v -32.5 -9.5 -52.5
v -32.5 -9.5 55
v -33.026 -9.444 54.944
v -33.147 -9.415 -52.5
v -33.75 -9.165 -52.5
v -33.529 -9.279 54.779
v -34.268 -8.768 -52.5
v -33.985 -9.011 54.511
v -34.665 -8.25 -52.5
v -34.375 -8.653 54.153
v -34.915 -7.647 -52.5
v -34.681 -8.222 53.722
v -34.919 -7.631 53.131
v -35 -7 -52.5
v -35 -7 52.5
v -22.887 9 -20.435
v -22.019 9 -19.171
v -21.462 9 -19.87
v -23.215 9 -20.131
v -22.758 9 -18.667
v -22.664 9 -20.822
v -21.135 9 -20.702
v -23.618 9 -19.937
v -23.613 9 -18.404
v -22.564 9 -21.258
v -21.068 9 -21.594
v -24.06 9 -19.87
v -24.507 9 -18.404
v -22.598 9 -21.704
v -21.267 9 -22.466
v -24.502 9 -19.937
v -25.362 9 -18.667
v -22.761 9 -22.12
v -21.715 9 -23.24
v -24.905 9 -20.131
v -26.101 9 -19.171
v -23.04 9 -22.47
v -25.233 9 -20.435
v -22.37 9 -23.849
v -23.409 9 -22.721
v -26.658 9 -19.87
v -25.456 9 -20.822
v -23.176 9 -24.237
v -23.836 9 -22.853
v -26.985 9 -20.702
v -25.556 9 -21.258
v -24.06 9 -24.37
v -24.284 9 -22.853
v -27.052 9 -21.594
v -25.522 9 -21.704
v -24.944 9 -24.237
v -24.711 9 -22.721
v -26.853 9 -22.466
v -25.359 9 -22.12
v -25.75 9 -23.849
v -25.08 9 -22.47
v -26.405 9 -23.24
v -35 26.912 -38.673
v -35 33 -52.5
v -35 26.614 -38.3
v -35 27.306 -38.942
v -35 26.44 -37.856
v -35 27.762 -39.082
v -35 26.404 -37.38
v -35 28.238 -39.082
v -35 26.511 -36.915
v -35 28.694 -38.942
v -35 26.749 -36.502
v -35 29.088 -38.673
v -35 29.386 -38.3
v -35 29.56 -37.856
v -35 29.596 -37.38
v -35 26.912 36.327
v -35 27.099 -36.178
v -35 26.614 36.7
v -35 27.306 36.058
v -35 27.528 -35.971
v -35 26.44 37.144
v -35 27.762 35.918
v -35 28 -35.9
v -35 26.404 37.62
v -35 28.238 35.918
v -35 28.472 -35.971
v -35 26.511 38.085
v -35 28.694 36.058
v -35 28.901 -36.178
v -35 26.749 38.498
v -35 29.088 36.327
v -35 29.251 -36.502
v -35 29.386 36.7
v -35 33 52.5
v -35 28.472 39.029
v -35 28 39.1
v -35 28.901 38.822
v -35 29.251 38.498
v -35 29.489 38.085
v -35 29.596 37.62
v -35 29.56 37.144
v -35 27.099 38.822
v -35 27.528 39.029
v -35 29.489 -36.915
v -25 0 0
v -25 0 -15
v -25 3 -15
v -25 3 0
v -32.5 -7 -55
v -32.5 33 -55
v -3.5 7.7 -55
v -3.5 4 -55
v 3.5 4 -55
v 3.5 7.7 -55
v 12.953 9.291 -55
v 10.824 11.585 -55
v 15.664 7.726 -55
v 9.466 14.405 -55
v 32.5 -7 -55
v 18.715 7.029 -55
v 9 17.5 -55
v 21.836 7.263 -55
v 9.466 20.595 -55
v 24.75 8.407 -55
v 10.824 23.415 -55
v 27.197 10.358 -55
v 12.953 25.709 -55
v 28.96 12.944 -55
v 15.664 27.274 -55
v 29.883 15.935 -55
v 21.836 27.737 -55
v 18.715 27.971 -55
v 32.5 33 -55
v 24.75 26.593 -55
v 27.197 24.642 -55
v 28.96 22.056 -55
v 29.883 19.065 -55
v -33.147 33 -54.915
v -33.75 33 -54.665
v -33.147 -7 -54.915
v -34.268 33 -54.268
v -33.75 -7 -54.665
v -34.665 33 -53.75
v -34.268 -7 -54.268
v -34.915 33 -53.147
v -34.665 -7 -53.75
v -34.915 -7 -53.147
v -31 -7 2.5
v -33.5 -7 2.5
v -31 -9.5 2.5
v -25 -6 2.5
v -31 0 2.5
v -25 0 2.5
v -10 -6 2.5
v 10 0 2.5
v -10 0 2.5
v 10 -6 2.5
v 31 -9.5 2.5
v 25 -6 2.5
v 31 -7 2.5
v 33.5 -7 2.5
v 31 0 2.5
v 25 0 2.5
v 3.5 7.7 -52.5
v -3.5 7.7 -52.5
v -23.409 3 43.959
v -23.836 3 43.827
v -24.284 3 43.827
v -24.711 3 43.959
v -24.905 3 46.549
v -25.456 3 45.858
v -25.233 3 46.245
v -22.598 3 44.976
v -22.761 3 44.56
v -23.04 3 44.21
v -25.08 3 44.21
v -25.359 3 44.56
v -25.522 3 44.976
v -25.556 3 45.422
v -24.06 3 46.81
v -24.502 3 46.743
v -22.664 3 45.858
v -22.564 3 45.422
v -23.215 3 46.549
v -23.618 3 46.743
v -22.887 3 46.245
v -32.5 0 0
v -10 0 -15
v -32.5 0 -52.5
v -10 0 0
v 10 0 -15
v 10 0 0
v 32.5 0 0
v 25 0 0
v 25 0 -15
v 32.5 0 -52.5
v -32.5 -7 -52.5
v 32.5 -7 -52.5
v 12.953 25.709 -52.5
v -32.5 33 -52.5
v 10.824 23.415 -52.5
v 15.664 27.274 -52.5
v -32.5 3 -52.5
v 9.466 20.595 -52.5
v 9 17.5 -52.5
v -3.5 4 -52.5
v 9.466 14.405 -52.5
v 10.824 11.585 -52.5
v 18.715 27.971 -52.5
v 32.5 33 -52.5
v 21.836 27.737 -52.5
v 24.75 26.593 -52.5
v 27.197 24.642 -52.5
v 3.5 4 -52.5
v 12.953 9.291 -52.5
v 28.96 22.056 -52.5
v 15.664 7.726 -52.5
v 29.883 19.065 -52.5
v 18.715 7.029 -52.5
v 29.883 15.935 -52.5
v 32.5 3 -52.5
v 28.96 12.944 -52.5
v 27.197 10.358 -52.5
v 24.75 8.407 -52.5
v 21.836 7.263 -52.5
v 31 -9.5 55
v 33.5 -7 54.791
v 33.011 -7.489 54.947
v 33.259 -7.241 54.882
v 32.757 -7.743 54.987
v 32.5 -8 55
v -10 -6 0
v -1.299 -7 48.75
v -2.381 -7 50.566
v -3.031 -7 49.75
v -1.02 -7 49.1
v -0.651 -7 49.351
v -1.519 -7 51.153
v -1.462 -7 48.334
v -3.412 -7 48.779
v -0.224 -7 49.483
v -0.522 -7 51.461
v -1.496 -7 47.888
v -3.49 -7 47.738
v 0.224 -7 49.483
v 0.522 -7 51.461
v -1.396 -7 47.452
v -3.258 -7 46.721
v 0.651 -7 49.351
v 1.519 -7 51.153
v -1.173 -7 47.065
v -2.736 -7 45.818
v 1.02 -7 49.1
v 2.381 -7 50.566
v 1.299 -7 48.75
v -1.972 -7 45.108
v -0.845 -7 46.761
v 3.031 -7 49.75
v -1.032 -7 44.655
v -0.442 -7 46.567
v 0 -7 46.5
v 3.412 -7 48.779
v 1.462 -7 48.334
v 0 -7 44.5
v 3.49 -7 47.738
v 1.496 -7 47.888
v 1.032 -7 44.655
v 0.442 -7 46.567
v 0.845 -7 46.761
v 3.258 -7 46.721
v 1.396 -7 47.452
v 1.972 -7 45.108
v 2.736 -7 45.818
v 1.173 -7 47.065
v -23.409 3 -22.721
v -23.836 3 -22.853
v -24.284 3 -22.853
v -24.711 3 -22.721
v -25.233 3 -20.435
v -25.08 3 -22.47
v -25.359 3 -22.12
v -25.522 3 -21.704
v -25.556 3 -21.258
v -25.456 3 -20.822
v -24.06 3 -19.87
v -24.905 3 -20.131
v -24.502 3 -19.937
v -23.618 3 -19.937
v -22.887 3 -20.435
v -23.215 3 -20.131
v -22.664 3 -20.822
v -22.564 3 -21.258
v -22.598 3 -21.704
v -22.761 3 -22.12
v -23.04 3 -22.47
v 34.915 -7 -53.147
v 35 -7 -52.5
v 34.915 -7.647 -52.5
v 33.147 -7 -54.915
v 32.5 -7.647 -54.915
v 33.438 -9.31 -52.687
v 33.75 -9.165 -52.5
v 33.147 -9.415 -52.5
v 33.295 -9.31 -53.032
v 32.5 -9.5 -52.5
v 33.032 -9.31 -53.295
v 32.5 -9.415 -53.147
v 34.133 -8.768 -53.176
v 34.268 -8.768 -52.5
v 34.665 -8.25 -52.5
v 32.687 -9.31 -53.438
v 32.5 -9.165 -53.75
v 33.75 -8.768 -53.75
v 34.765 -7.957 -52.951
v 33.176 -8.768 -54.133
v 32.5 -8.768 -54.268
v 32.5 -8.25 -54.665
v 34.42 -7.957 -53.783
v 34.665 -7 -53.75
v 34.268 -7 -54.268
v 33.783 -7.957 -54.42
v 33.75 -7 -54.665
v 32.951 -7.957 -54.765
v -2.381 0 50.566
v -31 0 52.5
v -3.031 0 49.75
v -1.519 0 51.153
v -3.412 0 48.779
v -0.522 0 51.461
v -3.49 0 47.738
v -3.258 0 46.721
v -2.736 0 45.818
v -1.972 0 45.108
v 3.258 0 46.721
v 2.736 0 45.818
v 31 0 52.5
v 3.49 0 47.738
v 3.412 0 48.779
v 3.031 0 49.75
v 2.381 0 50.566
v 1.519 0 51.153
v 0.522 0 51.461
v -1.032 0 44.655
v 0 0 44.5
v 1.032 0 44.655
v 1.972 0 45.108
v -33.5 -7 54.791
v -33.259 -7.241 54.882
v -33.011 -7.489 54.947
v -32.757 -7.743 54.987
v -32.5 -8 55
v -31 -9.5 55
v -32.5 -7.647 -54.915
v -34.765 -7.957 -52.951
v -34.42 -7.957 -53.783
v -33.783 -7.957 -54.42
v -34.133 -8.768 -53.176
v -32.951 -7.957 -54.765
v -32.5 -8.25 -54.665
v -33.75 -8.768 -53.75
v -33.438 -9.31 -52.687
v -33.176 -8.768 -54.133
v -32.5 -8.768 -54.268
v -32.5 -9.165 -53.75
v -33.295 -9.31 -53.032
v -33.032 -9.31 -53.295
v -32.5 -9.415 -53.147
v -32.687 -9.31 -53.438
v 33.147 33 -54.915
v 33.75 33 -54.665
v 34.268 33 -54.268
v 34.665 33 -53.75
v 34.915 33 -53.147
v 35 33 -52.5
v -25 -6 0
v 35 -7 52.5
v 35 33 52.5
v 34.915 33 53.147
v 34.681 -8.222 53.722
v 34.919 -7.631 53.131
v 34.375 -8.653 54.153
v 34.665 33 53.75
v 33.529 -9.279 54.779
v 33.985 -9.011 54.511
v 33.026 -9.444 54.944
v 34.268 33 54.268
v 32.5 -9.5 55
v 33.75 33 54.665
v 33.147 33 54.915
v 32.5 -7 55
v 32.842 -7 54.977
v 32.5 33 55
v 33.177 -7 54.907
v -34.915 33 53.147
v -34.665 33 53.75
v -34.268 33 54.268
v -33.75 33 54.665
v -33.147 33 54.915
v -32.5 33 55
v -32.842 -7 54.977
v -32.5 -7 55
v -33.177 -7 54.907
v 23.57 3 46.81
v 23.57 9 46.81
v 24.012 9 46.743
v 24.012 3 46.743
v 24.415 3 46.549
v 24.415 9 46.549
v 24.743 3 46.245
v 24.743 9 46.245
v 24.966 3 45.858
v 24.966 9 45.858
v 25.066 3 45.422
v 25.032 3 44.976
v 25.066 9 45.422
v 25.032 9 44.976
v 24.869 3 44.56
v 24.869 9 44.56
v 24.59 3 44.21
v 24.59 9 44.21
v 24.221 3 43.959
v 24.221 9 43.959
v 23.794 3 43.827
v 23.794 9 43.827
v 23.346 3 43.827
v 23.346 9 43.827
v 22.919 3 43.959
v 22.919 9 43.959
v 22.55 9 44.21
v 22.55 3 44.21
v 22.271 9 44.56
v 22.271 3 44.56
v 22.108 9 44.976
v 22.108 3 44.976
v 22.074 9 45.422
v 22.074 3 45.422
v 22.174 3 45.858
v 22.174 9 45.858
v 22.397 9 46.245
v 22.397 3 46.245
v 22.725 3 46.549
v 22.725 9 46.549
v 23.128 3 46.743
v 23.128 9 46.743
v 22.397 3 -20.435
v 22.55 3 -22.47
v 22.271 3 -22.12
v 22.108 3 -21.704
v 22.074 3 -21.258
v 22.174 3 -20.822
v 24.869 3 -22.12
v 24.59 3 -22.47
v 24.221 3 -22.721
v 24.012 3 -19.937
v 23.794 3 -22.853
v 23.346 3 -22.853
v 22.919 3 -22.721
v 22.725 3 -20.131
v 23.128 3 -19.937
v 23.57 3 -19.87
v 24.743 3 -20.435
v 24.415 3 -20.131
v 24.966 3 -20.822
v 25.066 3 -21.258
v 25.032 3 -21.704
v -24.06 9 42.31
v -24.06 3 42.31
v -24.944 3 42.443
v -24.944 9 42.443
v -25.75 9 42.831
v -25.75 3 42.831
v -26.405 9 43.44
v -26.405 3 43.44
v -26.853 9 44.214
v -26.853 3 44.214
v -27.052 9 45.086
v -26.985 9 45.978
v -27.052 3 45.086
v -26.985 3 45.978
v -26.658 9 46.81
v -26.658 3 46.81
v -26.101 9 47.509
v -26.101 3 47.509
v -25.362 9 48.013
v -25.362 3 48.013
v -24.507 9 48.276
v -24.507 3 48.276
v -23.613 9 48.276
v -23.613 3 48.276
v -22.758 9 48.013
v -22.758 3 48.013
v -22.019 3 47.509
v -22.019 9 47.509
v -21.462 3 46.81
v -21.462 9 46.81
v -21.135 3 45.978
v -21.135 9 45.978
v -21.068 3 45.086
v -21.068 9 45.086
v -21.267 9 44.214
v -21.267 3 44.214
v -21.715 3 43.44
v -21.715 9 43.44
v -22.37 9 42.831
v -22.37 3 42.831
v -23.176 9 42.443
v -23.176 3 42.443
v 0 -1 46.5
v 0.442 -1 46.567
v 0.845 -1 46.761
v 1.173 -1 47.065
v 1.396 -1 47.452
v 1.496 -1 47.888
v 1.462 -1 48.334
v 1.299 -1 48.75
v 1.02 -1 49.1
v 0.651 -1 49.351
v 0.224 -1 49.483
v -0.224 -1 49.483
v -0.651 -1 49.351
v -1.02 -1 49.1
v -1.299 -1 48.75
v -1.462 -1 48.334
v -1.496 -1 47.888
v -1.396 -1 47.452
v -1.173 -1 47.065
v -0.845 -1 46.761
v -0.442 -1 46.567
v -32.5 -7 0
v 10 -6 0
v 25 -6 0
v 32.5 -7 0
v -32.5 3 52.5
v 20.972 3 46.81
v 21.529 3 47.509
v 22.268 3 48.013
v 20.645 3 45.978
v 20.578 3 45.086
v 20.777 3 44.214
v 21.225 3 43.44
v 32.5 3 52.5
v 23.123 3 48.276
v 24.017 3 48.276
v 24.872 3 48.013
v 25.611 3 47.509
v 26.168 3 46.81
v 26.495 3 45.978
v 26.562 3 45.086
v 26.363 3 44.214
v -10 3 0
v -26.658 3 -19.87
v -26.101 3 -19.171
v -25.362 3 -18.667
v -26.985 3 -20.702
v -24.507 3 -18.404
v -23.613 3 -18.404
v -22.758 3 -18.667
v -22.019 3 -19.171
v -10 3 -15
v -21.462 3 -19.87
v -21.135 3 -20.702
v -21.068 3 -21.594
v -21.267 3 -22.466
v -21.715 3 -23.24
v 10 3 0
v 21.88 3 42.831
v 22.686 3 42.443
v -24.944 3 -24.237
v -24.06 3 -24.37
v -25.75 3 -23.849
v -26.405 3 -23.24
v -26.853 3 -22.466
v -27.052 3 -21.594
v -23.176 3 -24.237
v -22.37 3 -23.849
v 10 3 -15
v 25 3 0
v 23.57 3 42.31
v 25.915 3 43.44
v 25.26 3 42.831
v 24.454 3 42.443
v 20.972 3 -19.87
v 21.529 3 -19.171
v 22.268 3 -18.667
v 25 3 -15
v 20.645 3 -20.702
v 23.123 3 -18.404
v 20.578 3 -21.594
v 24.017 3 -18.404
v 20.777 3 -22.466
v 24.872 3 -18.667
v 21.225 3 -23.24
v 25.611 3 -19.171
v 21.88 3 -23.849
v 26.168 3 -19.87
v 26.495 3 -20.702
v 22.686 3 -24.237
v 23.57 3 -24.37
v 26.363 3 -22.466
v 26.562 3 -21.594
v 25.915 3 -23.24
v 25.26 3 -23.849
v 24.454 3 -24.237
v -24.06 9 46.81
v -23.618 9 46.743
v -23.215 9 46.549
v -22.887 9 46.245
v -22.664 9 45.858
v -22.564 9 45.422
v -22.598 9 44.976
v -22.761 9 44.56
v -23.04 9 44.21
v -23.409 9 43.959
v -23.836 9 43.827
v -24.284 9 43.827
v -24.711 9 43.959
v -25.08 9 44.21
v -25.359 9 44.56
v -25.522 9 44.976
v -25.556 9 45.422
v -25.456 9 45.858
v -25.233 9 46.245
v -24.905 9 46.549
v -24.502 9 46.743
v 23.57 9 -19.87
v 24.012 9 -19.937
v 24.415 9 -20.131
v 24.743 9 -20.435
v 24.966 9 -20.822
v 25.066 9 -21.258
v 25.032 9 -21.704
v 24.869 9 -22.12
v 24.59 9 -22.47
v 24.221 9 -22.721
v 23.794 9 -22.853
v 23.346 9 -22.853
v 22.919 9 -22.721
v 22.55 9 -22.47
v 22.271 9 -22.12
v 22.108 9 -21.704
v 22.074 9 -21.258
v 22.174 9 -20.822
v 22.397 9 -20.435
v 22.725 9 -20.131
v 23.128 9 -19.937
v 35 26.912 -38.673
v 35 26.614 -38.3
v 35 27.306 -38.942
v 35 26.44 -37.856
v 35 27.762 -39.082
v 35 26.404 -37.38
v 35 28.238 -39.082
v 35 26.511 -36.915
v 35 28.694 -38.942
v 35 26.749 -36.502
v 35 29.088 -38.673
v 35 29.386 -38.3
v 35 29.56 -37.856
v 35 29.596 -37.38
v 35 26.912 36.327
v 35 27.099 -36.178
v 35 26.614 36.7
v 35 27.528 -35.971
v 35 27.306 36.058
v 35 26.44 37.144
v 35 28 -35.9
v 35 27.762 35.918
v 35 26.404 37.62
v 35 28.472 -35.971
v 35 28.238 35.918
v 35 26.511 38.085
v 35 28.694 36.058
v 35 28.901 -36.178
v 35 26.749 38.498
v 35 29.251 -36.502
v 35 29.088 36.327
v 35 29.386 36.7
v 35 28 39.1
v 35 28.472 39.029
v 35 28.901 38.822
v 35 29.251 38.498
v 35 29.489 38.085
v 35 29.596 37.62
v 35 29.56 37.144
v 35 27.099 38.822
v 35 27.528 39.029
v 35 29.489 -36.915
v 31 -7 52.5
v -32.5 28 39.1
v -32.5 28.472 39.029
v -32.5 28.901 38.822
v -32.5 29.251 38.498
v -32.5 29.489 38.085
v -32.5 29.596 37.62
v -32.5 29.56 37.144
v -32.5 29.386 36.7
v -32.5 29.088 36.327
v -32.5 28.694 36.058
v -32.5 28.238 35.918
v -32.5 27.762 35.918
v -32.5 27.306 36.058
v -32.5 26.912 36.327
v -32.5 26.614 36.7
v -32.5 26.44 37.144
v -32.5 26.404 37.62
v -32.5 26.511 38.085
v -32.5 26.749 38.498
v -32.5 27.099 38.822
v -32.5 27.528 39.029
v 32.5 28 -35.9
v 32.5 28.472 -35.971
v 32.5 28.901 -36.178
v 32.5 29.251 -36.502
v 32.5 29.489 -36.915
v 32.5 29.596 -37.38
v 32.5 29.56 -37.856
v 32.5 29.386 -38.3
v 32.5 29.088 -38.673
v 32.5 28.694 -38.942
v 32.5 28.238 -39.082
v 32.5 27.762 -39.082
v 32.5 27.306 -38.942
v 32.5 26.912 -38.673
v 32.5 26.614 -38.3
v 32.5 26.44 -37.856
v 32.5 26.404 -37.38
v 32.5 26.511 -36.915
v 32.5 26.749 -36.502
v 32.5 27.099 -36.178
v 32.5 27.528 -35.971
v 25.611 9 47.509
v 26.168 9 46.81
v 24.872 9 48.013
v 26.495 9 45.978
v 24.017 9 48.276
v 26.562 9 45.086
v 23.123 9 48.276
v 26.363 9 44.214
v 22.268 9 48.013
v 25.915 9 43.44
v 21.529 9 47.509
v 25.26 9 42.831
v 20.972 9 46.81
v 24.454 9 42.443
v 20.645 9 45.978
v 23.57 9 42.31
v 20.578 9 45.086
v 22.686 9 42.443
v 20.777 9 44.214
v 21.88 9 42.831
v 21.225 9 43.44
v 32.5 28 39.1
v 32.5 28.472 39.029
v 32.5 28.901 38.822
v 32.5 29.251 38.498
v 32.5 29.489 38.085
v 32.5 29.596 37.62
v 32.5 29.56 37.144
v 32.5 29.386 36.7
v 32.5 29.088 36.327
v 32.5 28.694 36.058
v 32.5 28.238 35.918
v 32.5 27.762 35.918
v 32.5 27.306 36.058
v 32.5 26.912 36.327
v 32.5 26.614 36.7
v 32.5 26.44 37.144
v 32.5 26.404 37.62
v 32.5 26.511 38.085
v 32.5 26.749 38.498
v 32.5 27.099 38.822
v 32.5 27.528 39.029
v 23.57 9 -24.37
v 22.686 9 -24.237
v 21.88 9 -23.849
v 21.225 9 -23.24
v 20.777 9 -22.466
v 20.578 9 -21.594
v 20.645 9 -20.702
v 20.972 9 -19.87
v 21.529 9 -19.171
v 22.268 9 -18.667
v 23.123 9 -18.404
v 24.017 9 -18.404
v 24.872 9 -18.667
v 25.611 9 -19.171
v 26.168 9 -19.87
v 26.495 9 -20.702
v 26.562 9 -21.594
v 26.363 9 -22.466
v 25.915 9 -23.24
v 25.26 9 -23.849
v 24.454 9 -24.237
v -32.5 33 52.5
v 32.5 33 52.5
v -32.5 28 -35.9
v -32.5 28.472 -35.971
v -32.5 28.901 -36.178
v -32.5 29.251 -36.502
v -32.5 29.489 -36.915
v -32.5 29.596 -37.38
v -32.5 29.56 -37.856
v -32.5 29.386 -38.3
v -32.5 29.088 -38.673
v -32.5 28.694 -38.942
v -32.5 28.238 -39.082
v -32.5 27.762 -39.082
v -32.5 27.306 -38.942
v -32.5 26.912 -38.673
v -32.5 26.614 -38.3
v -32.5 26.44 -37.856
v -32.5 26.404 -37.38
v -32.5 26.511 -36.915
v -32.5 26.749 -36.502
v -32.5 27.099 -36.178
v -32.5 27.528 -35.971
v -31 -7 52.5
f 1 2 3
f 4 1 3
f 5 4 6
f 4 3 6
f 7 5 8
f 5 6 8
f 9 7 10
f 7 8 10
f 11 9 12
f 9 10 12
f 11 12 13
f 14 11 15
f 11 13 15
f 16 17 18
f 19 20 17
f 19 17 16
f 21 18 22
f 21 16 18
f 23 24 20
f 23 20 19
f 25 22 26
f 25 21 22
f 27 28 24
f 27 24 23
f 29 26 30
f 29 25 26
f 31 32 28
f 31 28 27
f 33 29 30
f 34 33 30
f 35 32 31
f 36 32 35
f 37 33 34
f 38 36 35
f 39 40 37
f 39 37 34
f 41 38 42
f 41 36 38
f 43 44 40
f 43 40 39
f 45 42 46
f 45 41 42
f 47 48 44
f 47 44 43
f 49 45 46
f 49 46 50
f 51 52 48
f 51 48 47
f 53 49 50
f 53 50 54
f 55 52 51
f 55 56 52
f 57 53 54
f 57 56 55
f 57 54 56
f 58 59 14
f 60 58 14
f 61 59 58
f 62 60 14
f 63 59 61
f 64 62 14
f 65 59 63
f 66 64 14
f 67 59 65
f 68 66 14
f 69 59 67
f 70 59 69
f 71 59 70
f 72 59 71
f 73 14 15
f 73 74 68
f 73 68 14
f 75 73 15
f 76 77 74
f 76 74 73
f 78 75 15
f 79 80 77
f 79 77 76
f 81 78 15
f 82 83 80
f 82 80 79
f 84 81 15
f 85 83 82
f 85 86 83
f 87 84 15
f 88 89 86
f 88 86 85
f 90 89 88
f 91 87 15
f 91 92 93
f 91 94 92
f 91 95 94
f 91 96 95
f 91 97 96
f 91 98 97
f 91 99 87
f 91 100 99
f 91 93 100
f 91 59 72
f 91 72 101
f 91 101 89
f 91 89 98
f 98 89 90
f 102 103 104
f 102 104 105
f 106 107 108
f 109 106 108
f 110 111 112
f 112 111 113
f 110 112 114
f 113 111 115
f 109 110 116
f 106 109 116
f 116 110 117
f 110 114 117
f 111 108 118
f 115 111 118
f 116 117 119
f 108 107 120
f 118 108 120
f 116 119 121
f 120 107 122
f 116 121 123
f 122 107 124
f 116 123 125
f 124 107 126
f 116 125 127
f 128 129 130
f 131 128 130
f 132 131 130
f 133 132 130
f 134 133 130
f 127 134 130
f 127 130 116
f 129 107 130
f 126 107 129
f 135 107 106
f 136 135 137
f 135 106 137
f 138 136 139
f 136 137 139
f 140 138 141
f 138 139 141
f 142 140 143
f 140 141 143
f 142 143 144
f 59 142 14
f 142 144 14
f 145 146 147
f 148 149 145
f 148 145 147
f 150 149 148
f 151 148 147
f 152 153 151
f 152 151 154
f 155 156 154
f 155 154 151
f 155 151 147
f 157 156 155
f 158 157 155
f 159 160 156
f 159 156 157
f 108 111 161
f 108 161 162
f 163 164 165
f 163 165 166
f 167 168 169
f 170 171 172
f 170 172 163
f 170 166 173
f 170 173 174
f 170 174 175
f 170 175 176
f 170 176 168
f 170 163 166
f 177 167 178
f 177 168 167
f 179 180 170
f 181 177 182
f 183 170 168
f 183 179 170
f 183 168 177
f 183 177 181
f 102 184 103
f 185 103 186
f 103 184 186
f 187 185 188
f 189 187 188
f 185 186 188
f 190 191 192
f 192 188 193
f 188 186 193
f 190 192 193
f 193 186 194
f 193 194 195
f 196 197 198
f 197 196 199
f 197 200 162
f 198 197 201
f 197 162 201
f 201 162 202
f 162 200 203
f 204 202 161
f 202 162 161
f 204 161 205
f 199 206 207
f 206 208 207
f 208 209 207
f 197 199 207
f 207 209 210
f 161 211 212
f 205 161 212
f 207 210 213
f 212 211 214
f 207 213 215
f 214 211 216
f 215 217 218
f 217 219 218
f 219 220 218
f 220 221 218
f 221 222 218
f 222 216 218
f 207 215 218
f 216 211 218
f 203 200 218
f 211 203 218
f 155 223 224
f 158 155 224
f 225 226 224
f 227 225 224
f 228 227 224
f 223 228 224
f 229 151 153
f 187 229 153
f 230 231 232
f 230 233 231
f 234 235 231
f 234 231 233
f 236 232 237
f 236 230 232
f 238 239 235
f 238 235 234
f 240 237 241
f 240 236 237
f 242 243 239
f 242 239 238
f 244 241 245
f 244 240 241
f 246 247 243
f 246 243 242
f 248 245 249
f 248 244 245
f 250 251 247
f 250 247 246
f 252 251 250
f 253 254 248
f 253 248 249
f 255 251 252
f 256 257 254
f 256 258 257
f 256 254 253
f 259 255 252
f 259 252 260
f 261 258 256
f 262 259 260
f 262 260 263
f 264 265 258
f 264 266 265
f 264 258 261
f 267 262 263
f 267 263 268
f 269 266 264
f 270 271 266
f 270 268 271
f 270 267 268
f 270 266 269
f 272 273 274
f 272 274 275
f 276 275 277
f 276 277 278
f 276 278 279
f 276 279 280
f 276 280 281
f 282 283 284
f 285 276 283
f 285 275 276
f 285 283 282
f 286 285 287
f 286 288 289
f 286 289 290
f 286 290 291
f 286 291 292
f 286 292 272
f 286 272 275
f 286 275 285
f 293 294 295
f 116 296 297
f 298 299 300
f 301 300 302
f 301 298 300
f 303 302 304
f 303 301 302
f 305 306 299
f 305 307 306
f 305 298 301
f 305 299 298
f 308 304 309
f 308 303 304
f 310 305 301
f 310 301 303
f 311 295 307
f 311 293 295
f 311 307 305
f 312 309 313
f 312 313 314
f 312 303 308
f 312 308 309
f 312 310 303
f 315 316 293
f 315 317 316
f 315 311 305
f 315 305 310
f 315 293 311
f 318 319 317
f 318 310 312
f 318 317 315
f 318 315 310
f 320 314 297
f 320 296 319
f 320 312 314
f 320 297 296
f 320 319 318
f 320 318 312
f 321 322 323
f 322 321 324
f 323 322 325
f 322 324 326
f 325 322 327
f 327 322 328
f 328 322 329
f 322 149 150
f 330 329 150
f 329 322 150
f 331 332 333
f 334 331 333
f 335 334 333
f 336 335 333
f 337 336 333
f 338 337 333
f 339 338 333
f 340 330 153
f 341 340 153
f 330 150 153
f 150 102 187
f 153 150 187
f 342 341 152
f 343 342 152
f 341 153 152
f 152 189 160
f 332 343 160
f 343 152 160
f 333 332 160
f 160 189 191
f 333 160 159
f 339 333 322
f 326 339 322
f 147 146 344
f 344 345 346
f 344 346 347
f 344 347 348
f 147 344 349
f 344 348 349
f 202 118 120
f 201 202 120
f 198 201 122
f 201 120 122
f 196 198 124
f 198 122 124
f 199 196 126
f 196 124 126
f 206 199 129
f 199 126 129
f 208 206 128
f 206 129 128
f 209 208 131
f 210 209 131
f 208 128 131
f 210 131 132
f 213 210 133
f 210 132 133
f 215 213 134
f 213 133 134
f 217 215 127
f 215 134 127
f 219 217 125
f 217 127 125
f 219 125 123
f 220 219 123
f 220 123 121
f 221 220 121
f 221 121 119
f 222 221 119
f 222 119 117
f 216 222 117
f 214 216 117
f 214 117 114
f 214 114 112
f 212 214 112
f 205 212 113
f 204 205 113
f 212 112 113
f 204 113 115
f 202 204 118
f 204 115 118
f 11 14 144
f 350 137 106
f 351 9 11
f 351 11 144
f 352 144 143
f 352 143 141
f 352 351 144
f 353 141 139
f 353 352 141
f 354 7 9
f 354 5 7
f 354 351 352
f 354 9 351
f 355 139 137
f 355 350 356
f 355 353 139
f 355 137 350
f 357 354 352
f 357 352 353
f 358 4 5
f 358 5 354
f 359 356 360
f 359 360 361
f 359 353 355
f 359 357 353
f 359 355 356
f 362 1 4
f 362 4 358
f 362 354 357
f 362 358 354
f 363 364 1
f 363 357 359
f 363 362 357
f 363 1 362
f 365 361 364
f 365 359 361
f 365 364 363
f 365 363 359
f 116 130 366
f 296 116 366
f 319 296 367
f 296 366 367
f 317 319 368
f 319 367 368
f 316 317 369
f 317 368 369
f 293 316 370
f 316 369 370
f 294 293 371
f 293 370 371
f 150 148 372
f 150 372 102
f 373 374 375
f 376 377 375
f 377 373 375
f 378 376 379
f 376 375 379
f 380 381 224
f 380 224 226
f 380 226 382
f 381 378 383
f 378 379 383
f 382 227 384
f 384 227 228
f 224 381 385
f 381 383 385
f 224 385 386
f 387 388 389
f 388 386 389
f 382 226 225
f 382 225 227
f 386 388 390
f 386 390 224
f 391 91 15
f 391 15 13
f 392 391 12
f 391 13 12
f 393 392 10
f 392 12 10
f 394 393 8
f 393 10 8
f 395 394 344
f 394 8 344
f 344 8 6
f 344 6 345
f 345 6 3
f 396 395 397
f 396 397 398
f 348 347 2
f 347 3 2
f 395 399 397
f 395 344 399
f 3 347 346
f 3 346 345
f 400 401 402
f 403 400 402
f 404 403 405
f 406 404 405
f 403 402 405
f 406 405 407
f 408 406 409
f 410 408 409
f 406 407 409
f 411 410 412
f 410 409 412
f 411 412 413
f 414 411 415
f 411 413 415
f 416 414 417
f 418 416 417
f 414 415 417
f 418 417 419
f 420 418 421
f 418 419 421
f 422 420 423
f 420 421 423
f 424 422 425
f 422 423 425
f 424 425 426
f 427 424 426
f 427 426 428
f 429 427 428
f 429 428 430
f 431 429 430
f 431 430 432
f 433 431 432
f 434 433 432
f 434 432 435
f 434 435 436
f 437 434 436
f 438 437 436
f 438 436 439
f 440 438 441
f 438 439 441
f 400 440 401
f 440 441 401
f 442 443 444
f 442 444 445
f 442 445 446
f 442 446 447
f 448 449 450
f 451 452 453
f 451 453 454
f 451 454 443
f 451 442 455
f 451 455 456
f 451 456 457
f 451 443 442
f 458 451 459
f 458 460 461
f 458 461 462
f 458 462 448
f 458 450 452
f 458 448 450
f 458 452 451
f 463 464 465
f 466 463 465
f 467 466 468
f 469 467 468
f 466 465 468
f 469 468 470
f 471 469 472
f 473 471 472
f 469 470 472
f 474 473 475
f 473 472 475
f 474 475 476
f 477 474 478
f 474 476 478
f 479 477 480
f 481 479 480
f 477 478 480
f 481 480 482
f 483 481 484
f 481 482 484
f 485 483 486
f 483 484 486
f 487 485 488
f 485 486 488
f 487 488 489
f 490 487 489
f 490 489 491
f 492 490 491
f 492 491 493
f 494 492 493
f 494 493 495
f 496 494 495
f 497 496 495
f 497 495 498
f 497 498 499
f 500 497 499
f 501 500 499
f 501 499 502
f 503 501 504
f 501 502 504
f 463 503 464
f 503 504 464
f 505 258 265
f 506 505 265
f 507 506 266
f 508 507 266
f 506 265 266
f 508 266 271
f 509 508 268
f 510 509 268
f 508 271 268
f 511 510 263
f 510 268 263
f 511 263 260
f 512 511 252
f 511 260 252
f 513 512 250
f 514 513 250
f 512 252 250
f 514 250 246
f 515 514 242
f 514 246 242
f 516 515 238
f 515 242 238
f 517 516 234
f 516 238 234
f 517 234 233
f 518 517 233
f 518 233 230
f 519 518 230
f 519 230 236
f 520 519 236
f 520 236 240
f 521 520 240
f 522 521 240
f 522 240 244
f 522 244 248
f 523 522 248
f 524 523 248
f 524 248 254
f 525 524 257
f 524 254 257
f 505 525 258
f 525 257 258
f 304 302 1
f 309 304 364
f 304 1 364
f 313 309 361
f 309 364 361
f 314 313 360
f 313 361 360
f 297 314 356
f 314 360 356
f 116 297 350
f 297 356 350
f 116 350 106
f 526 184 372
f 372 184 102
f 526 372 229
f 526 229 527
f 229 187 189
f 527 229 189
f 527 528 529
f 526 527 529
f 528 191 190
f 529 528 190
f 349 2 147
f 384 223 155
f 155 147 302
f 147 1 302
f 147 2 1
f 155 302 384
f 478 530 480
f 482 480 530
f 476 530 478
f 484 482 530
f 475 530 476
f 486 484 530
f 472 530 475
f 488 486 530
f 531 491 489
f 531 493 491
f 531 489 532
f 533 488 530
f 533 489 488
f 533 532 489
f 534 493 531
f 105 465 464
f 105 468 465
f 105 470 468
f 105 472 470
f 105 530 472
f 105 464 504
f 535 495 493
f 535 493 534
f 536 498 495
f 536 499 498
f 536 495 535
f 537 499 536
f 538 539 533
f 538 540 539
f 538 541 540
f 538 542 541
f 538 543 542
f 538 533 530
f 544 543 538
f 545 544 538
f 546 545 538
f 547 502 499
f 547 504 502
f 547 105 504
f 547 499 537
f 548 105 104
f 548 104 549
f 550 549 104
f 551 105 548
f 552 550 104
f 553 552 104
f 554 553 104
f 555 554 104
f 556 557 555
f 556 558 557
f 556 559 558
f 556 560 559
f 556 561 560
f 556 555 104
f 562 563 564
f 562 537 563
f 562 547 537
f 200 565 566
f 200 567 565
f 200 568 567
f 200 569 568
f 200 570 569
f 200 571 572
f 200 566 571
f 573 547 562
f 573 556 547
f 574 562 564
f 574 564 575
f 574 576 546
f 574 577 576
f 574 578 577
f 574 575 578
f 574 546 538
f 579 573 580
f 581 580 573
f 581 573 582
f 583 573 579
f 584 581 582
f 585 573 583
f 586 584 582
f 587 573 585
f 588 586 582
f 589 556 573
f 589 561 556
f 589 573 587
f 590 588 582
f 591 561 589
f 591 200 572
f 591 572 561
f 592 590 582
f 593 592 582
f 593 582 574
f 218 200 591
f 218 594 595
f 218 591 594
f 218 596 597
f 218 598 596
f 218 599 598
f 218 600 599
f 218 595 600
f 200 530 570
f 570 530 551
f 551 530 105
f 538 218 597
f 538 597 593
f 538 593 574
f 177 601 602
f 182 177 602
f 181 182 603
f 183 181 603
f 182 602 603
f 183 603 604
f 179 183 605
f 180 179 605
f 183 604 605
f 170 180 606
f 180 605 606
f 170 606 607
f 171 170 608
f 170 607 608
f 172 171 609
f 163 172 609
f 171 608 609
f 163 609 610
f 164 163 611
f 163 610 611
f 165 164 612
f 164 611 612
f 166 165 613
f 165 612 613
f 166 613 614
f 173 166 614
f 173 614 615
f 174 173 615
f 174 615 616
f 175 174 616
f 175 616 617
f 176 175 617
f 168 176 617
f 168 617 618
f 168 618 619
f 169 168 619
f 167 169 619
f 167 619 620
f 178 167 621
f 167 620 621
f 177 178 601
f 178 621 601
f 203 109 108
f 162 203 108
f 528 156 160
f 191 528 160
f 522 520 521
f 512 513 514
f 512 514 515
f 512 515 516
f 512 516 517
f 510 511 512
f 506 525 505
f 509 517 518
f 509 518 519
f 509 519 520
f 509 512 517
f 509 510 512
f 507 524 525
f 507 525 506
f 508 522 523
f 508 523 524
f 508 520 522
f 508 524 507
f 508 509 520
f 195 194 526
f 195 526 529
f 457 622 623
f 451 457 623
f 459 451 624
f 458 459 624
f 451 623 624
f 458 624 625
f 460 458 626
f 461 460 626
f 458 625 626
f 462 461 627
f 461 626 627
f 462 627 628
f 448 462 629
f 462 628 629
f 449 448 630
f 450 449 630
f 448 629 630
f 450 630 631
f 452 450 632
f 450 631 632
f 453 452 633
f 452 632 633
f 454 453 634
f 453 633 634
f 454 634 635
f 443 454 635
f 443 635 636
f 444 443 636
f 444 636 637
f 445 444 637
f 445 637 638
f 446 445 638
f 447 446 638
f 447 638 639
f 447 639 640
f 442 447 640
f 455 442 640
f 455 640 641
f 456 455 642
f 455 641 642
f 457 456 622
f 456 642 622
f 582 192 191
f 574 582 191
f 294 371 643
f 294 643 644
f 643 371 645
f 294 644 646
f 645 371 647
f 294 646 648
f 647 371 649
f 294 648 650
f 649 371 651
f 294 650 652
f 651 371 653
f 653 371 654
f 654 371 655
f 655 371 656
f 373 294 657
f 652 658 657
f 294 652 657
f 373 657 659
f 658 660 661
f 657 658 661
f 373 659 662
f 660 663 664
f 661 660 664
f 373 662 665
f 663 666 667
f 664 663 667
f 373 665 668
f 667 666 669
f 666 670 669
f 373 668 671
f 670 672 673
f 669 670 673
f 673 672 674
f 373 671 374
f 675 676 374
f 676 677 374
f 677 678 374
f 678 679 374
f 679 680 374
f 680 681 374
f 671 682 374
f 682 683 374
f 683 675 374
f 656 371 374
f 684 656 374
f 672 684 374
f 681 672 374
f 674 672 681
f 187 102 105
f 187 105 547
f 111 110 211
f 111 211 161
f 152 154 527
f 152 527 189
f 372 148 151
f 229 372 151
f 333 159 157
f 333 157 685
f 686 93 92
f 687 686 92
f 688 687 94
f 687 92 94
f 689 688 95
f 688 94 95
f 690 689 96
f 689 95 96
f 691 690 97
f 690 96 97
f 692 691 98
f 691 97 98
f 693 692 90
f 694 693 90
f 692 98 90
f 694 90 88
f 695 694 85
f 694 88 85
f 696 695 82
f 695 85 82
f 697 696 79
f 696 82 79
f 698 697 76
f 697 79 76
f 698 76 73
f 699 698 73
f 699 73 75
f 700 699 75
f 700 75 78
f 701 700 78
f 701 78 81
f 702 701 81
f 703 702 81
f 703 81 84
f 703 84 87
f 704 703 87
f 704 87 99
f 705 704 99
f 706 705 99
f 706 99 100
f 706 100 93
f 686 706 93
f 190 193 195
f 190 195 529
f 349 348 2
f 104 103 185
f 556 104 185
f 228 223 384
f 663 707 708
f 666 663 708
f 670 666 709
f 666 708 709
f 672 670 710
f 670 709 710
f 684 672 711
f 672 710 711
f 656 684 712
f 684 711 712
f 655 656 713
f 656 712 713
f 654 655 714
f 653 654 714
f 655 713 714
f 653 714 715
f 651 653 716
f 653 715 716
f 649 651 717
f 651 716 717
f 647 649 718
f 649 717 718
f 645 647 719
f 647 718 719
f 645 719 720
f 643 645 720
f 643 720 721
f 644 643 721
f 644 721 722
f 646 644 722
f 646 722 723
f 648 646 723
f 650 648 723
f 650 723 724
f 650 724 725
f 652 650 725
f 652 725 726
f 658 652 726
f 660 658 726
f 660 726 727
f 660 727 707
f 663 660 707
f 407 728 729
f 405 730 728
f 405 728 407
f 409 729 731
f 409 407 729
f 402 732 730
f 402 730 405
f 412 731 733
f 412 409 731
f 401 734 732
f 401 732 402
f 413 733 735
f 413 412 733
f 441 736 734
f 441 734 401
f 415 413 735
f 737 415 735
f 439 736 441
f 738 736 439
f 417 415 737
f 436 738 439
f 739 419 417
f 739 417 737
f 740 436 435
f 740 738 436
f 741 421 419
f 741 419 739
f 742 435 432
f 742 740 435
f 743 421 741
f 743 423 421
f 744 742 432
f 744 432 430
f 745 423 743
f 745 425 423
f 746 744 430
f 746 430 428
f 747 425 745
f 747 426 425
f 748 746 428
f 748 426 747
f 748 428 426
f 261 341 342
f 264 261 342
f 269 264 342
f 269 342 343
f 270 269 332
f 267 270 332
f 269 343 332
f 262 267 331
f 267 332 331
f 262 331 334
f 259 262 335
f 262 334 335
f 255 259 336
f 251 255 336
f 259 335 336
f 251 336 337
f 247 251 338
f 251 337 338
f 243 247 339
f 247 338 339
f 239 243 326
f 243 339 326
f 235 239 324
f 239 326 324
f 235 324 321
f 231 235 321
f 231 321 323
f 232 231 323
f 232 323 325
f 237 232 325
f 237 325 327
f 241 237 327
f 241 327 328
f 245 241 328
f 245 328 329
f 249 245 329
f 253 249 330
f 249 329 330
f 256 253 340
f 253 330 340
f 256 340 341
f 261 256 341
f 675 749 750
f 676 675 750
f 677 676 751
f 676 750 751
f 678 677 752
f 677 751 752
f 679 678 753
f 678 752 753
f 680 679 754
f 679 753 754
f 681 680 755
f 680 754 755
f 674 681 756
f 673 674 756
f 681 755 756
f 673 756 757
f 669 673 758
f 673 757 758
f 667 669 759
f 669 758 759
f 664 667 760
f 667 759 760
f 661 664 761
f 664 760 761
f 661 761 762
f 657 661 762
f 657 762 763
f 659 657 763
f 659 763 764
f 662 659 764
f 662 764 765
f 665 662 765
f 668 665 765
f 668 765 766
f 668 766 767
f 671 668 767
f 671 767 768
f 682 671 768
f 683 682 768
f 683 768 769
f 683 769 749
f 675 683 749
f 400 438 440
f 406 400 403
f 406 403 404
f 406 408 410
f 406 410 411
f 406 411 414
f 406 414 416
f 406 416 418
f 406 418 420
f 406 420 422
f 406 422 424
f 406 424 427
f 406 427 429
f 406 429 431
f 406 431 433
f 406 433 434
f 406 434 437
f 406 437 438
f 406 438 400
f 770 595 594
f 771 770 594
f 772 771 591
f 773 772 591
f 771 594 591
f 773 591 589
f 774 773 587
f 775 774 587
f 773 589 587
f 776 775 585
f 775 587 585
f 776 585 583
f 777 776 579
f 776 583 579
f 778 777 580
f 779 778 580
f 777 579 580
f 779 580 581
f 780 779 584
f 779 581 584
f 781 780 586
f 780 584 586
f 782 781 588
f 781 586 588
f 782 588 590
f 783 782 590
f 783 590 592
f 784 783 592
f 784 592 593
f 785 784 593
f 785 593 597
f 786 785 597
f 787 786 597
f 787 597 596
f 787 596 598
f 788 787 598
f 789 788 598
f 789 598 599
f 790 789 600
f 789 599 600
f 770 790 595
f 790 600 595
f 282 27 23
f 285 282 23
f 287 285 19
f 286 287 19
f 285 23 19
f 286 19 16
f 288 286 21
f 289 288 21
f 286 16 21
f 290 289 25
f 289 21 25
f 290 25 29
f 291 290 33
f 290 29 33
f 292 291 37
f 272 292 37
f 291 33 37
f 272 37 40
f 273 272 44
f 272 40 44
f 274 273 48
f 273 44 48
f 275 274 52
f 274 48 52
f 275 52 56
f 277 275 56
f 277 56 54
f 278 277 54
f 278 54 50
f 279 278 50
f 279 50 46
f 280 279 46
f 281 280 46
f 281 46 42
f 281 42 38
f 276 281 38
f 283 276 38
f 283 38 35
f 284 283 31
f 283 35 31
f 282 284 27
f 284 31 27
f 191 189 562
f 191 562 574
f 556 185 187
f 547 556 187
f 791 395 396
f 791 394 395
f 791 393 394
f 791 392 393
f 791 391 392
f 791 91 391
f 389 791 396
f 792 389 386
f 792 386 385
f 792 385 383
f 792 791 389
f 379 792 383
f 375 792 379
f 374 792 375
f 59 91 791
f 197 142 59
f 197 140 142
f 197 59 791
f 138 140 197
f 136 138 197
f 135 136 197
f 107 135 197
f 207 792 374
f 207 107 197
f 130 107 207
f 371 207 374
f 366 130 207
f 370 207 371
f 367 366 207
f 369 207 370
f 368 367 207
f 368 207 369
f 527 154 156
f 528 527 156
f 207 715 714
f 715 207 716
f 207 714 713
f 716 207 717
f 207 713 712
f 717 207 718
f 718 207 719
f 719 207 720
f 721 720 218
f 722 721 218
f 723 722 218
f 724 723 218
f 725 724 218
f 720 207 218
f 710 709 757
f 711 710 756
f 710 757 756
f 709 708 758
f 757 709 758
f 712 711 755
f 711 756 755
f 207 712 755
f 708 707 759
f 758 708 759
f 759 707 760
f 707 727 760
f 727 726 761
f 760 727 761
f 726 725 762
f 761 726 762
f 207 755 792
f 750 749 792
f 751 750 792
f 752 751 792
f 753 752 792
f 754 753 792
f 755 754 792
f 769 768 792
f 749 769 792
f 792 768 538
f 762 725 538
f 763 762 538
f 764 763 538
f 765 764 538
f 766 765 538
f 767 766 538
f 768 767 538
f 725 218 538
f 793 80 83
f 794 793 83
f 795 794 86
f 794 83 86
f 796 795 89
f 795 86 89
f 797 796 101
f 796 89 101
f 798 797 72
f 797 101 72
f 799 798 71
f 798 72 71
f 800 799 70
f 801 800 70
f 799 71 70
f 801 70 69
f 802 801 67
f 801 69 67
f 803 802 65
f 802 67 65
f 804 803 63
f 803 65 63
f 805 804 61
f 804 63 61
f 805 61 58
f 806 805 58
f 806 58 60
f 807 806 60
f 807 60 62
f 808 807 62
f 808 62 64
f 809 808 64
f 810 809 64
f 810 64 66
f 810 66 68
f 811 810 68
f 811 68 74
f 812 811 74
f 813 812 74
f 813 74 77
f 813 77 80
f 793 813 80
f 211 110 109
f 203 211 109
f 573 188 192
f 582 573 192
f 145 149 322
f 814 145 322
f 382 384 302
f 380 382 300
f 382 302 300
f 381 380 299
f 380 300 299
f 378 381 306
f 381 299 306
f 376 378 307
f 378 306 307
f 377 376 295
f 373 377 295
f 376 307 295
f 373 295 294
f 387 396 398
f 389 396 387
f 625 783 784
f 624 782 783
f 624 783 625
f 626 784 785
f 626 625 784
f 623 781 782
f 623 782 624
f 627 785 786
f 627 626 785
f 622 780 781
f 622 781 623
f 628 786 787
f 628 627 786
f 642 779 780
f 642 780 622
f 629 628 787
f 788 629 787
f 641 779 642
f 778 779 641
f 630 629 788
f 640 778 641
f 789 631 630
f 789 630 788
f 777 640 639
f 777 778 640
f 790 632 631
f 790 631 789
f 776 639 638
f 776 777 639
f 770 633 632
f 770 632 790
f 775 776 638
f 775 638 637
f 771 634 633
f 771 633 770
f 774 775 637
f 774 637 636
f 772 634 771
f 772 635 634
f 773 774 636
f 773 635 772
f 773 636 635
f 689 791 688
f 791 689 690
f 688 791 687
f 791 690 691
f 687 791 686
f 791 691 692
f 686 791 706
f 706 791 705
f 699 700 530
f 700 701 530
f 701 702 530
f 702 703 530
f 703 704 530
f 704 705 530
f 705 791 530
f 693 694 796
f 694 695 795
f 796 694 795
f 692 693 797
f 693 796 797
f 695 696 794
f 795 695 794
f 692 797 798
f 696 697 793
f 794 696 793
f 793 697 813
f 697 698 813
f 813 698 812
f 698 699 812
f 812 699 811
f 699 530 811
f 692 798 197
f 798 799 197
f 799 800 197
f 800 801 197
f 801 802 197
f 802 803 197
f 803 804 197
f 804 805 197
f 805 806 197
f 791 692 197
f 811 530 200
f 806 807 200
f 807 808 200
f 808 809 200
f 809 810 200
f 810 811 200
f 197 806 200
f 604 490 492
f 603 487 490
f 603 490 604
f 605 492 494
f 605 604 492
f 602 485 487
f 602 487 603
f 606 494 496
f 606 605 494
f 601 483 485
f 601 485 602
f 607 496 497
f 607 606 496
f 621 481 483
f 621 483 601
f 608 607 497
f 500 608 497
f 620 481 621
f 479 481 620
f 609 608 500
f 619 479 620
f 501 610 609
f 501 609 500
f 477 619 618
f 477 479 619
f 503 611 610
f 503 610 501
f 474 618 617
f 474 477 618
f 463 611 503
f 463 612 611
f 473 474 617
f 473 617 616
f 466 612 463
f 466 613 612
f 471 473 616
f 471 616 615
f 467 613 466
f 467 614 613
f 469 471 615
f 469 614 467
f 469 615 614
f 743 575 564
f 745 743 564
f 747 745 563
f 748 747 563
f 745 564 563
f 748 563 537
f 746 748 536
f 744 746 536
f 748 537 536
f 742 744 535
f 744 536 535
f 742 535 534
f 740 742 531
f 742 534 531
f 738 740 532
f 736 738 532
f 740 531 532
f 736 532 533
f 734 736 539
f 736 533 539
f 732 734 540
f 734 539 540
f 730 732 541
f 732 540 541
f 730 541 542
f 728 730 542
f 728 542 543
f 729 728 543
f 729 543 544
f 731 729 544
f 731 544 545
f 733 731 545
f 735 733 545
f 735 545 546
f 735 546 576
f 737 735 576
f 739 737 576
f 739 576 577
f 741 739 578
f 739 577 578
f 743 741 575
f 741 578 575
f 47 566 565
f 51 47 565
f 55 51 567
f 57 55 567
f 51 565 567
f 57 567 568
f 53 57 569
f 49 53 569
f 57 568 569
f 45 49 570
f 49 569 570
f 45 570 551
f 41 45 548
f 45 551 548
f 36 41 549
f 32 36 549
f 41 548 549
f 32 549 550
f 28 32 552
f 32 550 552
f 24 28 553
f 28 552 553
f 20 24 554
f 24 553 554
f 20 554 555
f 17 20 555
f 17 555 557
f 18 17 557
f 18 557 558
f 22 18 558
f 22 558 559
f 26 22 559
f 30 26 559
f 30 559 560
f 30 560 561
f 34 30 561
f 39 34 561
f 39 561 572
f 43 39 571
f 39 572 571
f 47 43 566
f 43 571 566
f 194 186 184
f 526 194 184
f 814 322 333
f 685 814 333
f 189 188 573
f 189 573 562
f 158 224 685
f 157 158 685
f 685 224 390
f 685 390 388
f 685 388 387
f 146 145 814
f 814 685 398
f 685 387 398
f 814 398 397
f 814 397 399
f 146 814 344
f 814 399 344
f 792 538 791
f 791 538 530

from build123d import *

# Parameters (mm, degrees)
SKETCH3_W           = 70
SKETCH3_H           = 110
BOSS_EXTRUDE1_DEPTH = 3
SKETCH4_W           = 2.5
SKETCH4_H           = 105
BOSS_EXTRUDE2_DEPTH = 30
SKETCH5_R           = 3
BOSS_EXTRUDE3_DEPTH = 6
SKETCH7_W           = 70
SKETCH7_H           = 110
SKETCH7_W_2         = 65
SKETCH7_H_2         = 52.5
SKETCH7_H_3         = 50
BOSS_EXTRUDE4_DEPTH = 9.5
SKETCH8_W           = 15
SKETCH8_H           = 6
CUT_EXTRUDE2_DEPTH  = 2.5
SKETCH9_W           = 15
SKETCH9_H           = 15
CUT_EXTRUDE3_DEPTH  = 3
SKETCH10_W          = 1.5
SKETCH10_H          = 50
BOSS_EXTRUDE5_DEPTH = 9.5
SKETCH11_W          = 31
SKETCH11_H          = 2.5
CUT_EXTRUDE5_DEPTH  = 52.5
SKETCH12_R          = 3.5
BOSS_EXTRUDE6_DEPTH = 7
SKETCH15_R          = 1.5
CUT_EXTRUDE6_DEPTH  = 6
SKETCH16_W          = 65
SKETCH16_H          = 2.5
BOSS_EXTRUDE7_DEPTH = 52.5
SKETCH17_R          = 1.6
CUT_EXTRUDE7_DEPTH  = 95.942087611
SKETCH18_W          = 7
SKETCH18_H          = 3.7
CUT_EXTRUDE8_DEPTH  = 2.5
SKETCH19_R          = 1.5
CUT_EXTRUDE9_DEPTH  = 6
SKETCH20_R          = 10.5
CUT_EXTRUDE10_DEPTH = 2.5
FILLET2_R           = 2.5
FILLET3_R           = 2.5


with BuildPart() as part:
    # Sketch3 → Boss-Extrude1 (new body)
    with BuildSketch(Plane(origin=(0, 0, 0), x_dir=(1, 0, 0), z_dir=(0, 1, 0))):
        Rectangle(SKETCH3_W, SKETCH3_H)
    extrude(amount=BOSS_EXTRUDE1_DEPTH)

    # Sketch4 → Boss-Extrude2 (add)
    with BuildSketch(Plane(origin=(0, 3, 0), x_dir=(1, 0, 0), z_dir=(0, 1, 0))):
        with Locations((-33.75, 0)):
            Rectangle(SKETCH4_W, SKETCH4_H)
        Polygon((35, 55), (-35, 55), (-35, 52.5), (-32.5, 52.5), (32.5, 52.5), (35, 52.5), align=None)
        Polygon((35, -55), (35, 52.5), (32.5, 52.5), (32.5, -52.5), (32.5, -55), align=None)
        Polygon((-32.5, -52.5), (-35, -52.5), (-35, -55), (32.5, -55), (32.5, -52.5), align=None)
    extrude(amount=BOSS_EXTRUDE2_DEPTH)

    # Sketch5 → Boss-Extrude3 (add)
    with BuildSketch(Plane(origin=(0, 3, 0), x_dir=(1, 0, 0), z_dir=(0, 1, 0))):
        with Locations(Location((-24.06, 21.37, 0), (0, 0, 90))):
            Circle(SKETCH5_R)
        with Locations(Location((23.57, 21.37, 0), (0, 0, 90))):
            Circle(SKETCH5_R)
        with Locations(Location((23.57, -45.31, 0), (0, 0, 90))):
            Circle(SKETCH5_R)
        with Locations(Location((-24.06, -45.31, 0), (0, 0, 90))):
            Circle(SKETCH5_R)
    extrude(amount=BOSS_EXTRUDE3_DEPTH)

    # Sketch7 → Boss-Extrude4 (add)
    with BuildSketch(Plane.XZ):
        Rectangle(SKETCH7_W, SKETCH7_H)
        with Locations((0, -26.25)):
            Rectangle(SKETCH7_W_2, SKETCH7_H_2, mode=Mode.SUBTRACT)
        with Locations((0, 27.5)):
            Rectangle(SKETCH7_W_2, SKETCH7_H_3, mode=Mode.SUBTRACT)
    extrude(amount=BOSS_EXTRUDE4_DEPTH)

    # Sketch8 → Cut-Extrude2 (cut)
    with BuildSketch(Plane.XY.offset(2.5)):
        with Locations((17.5, -3)):
            Rectangle(SKETCH8_W, SKETCH8_H)
        with Locations((-17.5, -3)):
            Rectangle(SKETCH8_W, SKETCH8_H)
    extrude(amount=-CUT_EXTRUDE2_DEPTH, mode=Mode.SUBTRACT)

    # Sketch9 → Cut-Extrude3 (cut)
    with BuildSketch(Plane.XZ):
        with Locations((-17.5, -7.5)):
            Rectangle(SKETCH9_W, SKETCH9_H)
        with Locations((17.5, -7.5)):
            Rectangle(SKETCH9_W, SKETCH9_H)
    extrude(amount=-CUT_EXTRUDE3_DEPTH, mode=Mode.SUBTRACT)

    # Sketch10 → Boss-Extrude5 (add)
    with BuildSketch(Plane.XZ):
        with Locations((-31.75, 27.5)):
            Rectangle(SKETCH10_W, SKETCH10_H)
        with Locations((31.75, 27.5)):
            Rectangle(SKETCH10_W, SKETCH10_H)
    extrude(amount=BOSS_EXTRUDE5_DEPTH)

    # Sketch11 → Cut-Extrude5 (cut)
    with BuildSketch(Plane.XY.offset(55)):
        with Locations((-15.5, -8.25)):
            Rectangle(SKETCH11_W, SKETCH11_H)
        Polygon((-33.5, -7), (-31, -9.5), (-31, -7), align=None)
        with Locations((15.5, -8.25)):
            Rectangle(SKETCH11_W, SKETCH11_H)
        Polygon((31, -7), (31, -9.5), (33.5, -7), align=None)
    extrude(amount=-CUT_EXTRUDE5_DEPTH, mode=Mode.SUBTRACT)

    # Sketch12 → Boss-Extrude6 (add)
    with BuildSketch(Plane.XZ):
        with Locations(Location((0, 48, 0), (0, 0, 270))):
            Circle(SKETCH12_R)
    extrude(amount=BOSS_EXTRUDE6_DEPTH)

    # Sketch15 → Cut-Extrude6 (cut)
    with BuildSketch(Plane.XZ.offset(7)):
        with Locations(Location((0, 48, 0), (0, 0, 270))):
            Circle(SKETCH15_R)
    extrude(amount=-CUT_EXTRUDE6_DEPTH, mode=Mode.SUBTRACT)

    # Sketch16 → Boss-Extrude7 (add)
    with BuildSketch(Plane.XY.offset(-52.5)):
        with Locations((0, -8.25)):
            Rectangle(SKETCH16_W, SKETCH16_H)
    extrude(amount=BOSS_EXTRUDE7_DEPTH)

    # Sketch17 → Cut-Extrude7 (cut, through all)
    with BuildSketch(Plane.ZY.offset(35)):
        with Locations((-37.5, 28)):
            Circle(SKETCH17_R)
        with Locations((37.5, 28)):
            Circle(SKETCH17_R)
    extrude(amount=-CUT_EXTRUDE7_DEPTH, mode=Mode.SUBTRACT)

    # Sketch18 → Cut-Extrude8 (cut)
    with BuildSketch(Plane(origin=(0, 0, -55), x_dir=(-1, 0, 0), z_dir=(0, 0, -1))):
        with Locations((0, 5.85)):
            Rectangle(SKETCH18_W, SKETCH18_H)
    extrude(amount=-CUT_EXTRUDE8_DEPTH, mode=Mode.SUBTRACT)

    # Sketch19 → Cut-Extrude9 (cut)
    with BuildSketch(Plane(origin=(0, 9, 0), x_dir=(1, 0, 0), z_dir=(0, 1, 0))):
        with Locations(Location((-24.06, -45.31, 0), (0, 0, 270))):
            Circle(SKETCH19_R)
        with Locations(Location((-24.06, 21.37, 0), (0, 0, 270))):
            Circle(SKETCH19_R)
        with Locations(Location((23.57, 21.37, 0), (0, 0, 270))):
            Circle(SKETCH19_R)
        with Locations(Location((23.57, -45.31, 0), (0, 0, 270))):
            Circle(SKETCH19_R)
    extrude(amount=-CUT_EXTRUDE9_DEPTH, mode=Mode.SUBTRACT)

    # Sketch20 → Cut-Extrude10 (cut)
    with BuildSketch(Plane(origin=(0, 0, -55), x_dir=(-1, 0, 0), z_dir=(0, 0, -1))):
        with Locations((-19.5, 17.5)):
            Circle(SKETCH20_R)
    extrude(amount=-CUT_EXTRUDE10_DEPTH, mode=Mode.SUBTRACT)

    # Fillet2
    # the kernel refuses this fillet: 2.5 mm, written as the material it takes off along each edge
    with BuildSketch(Plane(origin=(-35, -15.75, -55), x_dir=(1, 0, 0), z_dir=(0, 1, 0)), Plane(origin=(35, 39.25, -55), x_dir=(-1, 0, 0), z_dir=(0, -1, 0)), Plane(origin=(35, 39.25, 55), x_dir=(0, 0, -1), z_dir=(0, -1, 0)), Plane(origin=(-35, -15.75, 55), x_dir=(0, 0, -1), z_dir=(0, 1, 0))) as fillet2_piece_1:
        with BuildLine():
            CenterArc((FILLET2_R, -FILLET2_R), FILLET2_R, 90, 90)
            Line((0, -FILLET2_R), (0, 0))
            Line((0, 0), (FILLET2_R, 0))
        make_face()
    extrude(amount=55, mode=Mode.SUBTRACT)

    # Fillet3
    # the kernel refuses this fillet: 2.5 mm, written as the material it takes off along each edge
    with BuildSketch(Plane(origin=(-32.5, -9.5, -52.5), x_dir=(-1, 0, 0), z_dir=(0, 0, 1))) as fillet3_piece_1:
        with BuildLine():
            CenterArc((2.5 - FILLET3_R, -FILLET3_R), FILLET3_R, 0, 90)
            Line((2.5, -FILLET3_R), (2.5, 0))
            Line((2.5, 0), (2.5 - FILLET3_R, 0))
        make_face()
    revolve(axis=Axis((-32.5, -9.5, -52.5), (0, -1, 0)), revolution_arc=90, mode=Mode.SUBTRACT)
    with BuildSketch(Plane(origin=(32.5, -9.5, -52.5), x_dir=(1, 0, 0), z_dir=(0, 0, 1))) as fillet3_piece_2:
        with BuildLine():
            CenterArc((2.5 - FILLET3_R, FILLET3_R), FILLET3_R, 270, 90)
            Line((2.5 - FILLET3_R, 0), (2.5, 0))
            Line((2.5, 0), (2.5, FILLET3_R))
        make_face()
    revolve(axis=Axis((32.5, -9.5, -52.5), (0, 1, 0)), revolution_arc=90, mode=Mode.SUBTRACT)
    with BuildSketch(Plane(origin=(35, -9.5, -52.5), x_dir=(-1, 0, 0), z_dir=(0, 0, 1)), Plane(origin=(-35, -9.5, 58.75), x_dir=(1, 0, 0), z_dir=(0, 0, -1))) as fillet3_piece_3:
        with BuildLine():
            CenterArc((FILLET3_R, -FILLET3_R), FILLET3_R, 90, 90)
            Line((0, -FILLET3_R), (0, 0))
            Line((0, 0), (FILLET3_R, 0))
        make_face()
    extrude(amount=111.25, mode=Mode.SUBTRACT)
    with BuildSketch(Plane(origin=(-32.5, -9.5, -55), x_dir=(0, 1, 0), z_dir=(1, 0, 0))) as fillet3_piece_4:
        with BuildLine():
            CenterArc((FILLET3_R, FILLET3_R), FILLET3_R, 180, 90)
            Line((0, FILLET3_R), (0, 0))
            Line((0, 0), (FILLET3_R, 0))
        make_face()
    extrude(amount=65, mode=Mode.SUBTRACT)


solid = part.part
